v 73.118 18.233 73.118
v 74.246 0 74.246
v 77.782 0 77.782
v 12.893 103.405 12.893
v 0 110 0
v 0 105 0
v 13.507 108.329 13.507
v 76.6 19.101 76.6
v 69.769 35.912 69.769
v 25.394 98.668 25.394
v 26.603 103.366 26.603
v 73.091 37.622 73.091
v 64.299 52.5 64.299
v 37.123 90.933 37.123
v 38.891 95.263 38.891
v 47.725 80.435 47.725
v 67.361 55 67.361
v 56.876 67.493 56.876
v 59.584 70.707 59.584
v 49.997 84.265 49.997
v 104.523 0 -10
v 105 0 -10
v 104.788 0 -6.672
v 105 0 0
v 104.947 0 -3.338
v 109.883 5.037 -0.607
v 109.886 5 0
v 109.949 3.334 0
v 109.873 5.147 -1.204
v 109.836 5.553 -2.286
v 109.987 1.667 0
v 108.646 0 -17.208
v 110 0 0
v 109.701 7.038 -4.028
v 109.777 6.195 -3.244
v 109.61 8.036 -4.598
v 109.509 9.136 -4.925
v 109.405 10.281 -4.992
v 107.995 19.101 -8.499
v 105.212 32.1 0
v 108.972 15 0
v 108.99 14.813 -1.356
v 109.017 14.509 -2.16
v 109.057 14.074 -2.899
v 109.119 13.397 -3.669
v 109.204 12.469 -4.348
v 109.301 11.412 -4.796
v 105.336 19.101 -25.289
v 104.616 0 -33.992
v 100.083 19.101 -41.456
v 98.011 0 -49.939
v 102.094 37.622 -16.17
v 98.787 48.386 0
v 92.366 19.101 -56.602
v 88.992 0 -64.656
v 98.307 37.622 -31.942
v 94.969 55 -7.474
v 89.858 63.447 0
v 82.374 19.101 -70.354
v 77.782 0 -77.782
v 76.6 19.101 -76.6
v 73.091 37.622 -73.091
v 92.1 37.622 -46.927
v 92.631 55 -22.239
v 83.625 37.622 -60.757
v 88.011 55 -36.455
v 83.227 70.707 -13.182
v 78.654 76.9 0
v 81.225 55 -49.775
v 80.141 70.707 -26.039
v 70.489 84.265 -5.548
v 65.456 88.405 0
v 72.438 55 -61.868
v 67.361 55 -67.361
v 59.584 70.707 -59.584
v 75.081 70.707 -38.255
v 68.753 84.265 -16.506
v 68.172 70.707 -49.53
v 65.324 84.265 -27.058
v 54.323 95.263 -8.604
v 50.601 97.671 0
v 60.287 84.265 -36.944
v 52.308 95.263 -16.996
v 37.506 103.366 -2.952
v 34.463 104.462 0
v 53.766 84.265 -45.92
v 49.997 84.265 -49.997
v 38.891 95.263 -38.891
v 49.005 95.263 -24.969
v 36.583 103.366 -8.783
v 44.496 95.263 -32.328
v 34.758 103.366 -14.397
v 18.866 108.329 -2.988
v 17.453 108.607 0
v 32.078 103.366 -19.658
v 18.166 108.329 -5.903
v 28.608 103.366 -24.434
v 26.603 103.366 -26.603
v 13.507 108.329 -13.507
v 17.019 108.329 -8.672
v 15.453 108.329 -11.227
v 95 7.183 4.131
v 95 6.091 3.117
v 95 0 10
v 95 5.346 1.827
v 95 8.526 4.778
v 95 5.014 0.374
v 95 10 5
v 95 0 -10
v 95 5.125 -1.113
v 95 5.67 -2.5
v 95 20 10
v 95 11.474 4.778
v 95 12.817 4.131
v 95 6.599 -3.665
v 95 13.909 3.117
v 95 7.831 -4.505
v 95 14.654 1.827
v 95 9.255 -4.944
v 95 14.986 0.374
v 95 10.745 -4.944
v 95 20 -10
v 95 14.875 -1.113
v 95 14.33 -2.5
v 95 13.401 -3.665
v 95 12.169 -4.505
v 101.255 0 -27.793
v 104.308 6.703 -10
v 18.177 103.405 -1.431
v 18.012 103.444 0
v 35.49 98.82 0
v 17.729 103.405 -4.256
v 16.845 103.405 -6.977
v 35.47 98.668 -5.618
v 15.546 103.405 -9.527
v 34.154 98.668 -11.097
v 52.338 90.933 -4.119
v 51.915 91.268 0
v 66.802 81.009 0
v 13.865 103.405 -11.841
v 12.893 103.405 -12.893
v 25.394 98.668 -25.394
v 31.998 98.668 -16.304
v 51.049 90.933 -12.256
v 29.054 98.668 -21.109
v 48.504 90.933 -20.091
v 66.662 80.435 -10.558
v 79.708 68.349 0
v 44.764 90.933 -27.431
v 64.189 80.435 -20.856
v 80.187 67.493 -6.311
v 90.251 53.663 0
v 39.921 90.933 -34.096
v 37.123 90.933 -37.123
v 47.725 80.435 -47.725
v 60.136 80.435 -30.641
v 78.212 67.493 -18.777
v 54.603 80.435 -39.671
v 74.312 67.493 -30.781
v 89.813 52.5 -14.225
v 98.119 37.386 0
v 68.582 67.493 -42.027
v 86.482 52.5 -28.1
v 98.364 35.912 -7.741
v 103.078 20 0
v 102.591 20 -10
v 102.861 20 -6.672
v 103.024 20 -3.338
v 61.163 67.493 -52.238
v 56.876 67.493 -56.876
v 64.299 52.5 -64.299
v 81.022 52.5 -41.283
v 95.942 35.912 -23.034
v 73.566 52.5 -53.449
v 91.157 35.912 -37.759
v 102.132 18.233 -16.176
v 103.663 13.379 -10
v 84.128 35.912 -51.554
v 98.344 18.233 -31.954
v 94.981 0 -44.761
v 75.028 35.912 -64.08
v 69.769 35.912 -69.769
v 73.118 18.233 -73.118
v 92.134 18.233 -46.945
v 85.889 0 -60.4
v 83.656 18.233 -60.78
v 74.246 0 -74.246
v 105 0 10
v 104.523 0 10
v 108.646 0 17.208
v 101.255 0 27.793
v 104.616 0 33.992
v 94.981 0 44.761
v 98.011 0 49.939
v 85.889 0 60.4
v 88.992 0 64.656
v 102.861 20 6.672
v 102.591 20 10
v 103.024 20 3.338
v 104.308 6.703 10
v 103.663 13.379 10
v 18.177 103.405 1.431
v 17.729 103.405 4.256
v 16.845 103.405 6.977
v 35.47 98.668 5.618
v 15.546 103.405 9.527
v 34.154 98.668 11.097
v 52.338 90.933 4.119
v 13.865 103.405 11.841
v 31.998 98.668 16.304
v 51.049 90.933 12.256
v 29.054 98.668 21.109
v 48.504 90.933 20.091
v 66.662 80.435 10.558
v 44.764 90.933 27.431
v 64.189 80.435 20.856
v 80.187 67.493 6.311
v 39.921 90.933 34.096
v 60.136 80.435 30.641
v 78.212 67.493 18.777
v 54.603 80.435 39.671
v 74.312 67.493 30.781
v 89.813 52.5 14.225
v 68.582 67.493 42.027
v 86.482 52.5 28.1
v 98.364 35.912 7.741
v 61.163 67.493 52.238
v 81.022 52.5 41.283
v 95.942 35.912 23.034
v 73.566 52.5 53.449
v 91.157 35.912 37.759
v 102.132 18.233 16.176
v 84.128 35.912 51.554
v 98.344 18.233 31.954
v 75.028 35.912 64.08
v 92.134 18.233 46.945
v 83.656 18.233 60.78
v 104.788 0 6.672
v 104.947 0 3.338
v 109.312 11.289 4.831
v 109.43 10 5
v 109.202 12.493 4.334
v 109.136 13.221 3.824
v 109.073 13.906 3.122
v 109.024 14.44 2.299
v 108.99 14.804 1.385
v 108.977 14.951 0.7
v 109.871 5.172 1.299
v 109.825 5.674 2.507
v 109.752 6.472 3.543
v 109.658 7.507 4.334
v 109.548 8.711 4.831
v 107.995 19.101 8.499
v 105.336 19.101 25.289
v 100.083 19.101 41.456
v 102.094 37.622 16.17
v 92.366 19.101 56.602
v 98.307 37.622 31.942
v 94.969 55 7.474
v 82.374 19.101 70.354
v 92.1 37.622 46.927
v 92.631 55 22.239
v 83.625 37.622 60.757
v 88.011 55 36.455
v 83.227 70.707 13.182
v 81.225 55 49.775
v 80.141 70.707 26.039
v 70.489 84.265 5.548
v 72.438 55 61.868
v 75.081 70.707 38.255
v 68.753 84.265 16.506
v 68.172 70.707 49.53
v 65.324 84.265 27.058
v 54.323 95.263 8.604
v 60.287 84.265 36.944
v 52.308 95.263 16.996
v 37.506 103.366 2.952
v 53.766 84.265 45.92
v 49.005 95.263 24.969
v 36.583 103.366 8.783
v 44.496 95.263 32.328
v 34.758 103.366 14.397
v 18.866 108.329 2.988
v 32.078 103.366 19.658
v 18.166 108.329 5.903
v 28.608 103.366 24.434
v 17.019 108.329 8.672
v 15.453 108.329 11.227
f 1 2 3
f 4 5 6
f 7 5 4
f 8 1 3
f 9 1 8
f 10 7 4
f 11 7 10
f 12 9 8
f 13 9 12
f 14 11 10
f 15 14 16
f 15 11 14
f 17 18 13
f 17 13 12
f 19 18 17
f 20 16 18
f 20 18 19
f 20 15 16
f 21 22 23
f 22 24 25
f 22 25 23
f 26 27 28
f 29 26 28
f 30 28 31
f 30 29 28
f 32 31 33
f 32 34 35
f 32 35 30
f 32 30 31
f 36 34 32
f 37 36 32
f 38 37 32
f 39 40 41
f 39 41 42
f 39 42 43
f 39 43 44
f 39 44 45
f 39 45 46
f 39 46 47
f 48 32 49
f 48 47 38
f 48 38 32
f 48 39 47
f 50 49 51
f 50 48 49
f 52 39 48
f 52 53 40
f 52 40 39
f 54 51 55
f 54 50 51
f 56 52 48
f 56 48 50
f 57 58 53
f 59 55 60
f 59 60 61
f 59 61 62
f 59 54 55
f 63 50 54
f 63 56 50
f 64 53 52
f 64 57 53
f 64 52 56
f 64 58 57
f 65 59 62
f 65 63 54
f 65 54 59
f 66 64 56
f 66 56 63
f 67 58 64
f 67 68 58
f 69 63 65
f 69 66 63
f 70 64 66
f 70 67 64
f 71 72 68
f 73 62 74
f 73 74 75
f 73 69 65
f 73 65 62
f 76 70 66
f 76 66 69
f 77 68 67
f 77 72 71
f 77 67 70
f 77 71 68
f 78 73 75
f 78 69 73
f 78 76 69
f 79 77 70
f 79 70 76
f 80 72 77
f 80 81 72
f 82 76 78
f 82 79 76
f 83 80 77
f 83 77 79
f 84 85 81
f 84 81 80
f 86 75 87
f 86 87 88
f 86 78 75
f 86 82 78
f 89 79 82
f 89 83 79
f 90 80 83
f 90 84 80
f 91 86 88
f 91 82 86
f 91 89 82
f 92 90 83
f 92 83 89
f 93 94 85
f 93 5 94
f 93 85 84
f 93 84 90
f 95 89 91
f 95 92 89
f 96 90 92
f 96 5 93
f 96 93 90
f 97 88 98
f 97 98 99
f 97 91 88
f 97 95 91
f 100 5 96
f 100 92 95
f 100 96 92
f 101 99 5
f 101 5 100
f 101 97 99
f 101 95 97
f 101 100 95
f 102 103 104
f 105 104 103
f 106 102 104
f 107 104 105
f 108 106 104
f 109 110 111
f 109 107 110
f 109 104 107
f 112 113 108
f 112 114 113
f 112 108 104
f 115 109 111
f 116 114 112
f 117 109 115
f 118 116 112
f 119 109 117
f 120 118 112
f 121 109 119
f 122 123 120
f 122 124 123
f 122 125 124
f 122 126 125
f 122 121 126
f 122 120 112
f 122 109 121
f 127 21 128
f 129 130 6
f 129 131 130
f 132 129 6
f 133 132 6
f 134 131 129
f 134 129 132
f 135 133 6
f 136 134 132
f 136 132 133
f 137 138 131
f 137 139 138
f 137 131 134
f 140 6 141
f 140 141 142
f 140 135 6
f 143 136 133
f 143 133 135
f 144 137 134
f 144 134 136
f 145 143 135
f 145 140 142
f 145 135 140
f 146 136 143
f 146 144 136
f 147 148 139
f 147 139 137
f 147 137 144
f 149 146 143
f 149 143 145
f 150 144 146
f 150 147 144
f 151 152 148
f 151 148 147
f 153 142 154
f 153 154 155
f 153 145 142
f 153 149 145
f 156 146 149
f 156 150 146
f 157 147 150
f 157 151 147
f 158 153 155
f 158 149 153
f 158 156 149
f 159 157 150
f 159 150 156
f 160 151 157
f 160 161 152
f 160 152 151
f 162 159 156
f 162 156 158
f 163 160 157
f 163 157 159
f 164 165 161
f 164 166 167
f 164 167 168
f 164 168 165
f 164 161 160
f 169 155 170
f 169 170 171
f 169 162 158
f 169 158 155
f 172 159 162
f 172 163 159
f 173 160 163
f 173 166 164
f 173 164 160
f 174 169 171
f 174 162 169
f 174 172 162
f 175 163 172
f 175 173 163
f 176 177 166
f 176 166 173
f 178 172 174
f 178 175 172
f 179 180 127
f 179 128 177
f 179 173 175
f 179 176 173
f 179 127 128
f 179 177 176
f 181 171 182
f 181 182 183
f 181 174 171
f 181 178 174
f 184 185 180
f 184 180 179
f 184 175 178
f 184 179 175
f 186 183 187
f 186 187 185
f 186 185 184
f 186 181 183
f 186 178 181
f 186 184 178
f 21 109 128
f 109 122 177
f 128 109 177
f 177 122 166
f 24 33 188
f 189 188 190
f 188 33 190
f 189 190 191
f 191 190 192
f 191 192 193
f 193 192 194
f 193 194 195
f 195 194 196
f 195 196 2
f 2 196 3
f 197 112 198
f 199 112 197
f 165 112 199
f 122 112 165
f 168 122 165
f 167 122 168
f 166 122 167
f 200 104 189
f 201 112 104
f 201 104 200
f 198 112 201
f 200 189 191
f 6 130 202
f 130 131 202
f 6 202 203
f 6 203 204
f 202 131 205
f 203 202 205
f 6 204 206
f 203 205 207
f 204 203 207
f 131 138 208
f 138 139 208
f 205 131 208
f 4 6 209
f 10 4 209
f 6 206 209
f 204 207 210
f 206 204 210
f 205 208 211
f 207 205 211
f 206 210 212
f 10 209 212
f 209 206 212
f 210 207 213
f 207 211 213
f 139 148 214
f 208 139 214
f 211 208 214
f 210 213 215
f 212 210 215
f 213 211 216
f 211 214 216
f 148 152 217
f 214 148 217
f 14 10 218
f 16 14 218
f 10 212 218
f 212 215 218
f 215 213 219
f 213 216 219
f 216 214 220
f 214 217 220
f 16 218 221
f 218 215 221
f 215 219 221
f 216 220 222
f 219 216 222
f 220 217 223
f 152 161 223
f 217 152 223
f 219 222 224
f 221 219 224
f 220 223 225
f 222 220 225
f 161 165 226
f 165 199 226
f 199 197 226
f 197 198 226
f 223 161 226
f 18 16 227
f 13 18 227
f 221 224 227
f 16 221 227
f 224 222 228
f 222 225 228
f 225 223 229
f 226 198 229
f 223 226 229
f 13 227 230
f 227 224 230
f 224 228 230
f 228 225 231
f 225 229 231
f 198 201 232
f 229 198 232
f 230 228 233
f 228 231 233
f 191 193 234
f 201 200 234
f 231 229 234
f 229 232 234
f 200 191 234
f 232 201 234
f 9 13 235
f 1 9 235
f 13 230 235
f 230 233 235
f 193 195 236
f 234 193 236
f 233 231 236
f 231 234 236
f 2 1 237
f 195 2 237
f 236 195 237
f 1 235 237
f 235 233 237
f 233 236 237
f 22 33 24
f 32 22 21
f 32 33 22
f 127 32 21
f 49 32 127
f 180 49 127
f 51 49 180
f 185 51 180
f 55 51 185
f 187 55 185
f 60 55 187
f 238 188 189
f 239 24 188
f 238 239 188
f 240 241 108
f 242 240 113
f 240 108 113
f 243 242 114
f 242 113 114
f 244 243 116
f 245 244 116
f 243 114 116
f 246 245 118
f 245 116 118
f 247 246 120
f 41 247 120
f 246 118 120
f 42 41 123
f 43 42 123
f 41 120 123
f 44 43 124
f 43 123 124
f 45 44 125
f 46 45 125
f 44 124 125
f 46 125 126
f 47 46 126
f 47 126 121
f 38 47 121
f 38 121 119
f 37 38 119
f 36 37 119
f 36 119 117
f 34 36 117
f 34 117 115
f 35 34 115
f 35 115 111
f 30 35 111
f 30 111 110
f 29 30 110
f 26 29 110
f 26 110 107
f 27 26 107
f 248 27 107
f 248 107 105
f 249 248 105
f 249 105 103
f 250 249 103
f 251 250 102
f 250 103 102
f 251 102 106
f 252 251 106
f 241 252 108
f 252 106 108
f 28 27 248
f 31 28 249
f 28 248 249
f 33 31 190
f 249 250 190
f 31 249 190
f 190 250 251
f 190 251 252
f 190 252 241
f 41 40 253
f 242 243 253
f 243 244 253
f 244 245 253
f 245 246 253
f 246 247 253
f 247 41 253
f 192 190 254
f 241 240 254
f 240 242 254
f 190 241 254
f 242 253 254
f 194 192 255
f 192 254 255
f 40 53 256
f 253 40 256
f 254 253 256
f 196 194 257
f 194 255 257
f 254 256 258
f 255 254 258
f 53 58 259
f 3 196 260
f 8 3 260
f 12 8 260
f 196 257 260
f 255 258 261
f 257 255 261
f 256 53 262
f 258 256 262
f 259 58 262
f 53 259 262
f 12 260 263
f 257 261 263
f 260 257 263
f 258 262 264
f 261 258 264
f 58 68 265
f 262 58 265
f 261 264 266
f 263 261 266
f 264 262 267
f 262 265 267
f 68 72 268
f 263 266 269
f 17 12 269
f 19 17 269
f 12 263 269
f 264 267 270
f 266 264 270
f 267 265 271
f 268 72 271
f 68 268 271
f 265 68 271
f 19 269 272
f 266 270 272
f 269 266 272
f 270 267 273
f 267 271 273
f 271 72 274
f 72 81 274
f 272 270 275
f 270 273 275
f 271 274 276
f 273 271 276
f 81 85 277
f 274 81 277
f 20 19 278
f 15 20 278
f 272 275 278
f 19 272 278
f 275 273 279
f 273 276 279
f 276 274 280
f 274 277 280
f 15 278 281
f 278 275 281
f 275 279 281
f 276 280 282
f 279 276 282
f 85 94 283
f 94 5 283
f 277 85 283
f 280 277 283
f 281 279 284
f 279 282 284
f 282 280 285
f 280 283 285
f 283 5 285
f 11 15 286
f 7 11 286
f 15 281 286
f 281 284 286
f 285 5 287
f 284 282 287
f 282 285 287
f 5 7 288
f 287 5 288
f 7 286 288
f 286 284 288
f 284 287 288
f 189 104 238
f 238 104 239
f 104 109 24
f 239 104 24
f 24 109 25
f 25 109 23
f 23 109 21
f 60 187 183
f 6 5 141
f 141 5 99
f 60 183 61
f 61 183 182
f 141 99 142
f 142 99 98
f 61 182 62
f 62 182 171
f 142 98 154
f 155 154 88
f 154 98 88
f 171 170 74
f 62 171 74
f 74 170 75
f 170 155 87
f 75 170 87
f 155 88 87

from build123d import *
from build123d.topology import SkipClean

# Parameters (mm, degrees)
REVOLVE1_ANGLE           = 45
REVOLVE1_OTHER_WAY_ANGLE = 45
BOSS_EXTRUDE1_DEPTH      = 10
BOSS_EXTRUDE1_DEPTH_BACK = 10
SKETCH2_W                = 10
SKETCH2_H                = 20
SKETCH3_R                = 5
CUT_EXTRUDE1_DEPTH       = 165.848415218


with BuildPart() as part:
    # Sketch1 → Revolve1 (revolve)
    with BuildSketch(Plane.XY):
        with BuildLine():
            Line((105, 0), (110, 0))
            ThreePointArc((110, 0), (77.781745931, 77.781745931), (0, 110))
            Line((0, 110), (0, 105))
            ThreePointArc((0, 105), (74.246212025, 74.246212025), (105, 0))
        make_face()
    revolve(axis=Axis((0, 110, 0), (0, -1, 0)), revolution_arc=REVOLVE1_ANGLE)

    # Sketch1 → Revolve1 other way (revolve)
    with SkipClean():  # the faces are left unmerged after this step: merging them gives an invalid solid
        with BuildSketch(Plane.XY):
            with BuildLine():
                Line((105, 0), (110, 0))
                ThreePointArc((110, 0), (77.781745931, 77.781745931), (0, 110))
                Line((0, 110), (0, 105))
                ThreePointArc((0, 105), (74.246212025, 74.246212025), (105, 0))
            make_face()
        revolve(axis=Axis((0, 110, 0), (0, 1, 0)), revolution_arc=REVOLVE1_OTHER_WAY_ANGLE)

    # Sketch2 → Boss-Extrude1 (add, two sides: drawn at the far end of the back side and taken through both)
    with SkipClean():  # the faces are left unmerged after this step: merging them gives an invalid solid
        with BuildSketch(Plane.XY.offset(-BOSS_EXTRUDE1_DEPTH_BACK)):
            with Locations((100, 10)):
                Rectangle(SKETCH2_W, SKETCH2_H)
        extrude(amount=BOSS_EXTRUDE1_DEPTH + BOSS_EXTRUDE1_DEPTH_BACK)

    # Sketch3 → Cut-Extrude1 (cut, through all)
    with SkipClean():  # the faces are left unmerged after this step: merging them gives an invalid solid
        with BuildSketch(Plane.ZY.offset(-95)):
            with Locations((0, 10)):
                Circle(SKETCH3_R)
        extrude(amount=-CUT_EXTRUDE1_DEPTH, mode=Mode.SUBTRACT)


solid = part.part
